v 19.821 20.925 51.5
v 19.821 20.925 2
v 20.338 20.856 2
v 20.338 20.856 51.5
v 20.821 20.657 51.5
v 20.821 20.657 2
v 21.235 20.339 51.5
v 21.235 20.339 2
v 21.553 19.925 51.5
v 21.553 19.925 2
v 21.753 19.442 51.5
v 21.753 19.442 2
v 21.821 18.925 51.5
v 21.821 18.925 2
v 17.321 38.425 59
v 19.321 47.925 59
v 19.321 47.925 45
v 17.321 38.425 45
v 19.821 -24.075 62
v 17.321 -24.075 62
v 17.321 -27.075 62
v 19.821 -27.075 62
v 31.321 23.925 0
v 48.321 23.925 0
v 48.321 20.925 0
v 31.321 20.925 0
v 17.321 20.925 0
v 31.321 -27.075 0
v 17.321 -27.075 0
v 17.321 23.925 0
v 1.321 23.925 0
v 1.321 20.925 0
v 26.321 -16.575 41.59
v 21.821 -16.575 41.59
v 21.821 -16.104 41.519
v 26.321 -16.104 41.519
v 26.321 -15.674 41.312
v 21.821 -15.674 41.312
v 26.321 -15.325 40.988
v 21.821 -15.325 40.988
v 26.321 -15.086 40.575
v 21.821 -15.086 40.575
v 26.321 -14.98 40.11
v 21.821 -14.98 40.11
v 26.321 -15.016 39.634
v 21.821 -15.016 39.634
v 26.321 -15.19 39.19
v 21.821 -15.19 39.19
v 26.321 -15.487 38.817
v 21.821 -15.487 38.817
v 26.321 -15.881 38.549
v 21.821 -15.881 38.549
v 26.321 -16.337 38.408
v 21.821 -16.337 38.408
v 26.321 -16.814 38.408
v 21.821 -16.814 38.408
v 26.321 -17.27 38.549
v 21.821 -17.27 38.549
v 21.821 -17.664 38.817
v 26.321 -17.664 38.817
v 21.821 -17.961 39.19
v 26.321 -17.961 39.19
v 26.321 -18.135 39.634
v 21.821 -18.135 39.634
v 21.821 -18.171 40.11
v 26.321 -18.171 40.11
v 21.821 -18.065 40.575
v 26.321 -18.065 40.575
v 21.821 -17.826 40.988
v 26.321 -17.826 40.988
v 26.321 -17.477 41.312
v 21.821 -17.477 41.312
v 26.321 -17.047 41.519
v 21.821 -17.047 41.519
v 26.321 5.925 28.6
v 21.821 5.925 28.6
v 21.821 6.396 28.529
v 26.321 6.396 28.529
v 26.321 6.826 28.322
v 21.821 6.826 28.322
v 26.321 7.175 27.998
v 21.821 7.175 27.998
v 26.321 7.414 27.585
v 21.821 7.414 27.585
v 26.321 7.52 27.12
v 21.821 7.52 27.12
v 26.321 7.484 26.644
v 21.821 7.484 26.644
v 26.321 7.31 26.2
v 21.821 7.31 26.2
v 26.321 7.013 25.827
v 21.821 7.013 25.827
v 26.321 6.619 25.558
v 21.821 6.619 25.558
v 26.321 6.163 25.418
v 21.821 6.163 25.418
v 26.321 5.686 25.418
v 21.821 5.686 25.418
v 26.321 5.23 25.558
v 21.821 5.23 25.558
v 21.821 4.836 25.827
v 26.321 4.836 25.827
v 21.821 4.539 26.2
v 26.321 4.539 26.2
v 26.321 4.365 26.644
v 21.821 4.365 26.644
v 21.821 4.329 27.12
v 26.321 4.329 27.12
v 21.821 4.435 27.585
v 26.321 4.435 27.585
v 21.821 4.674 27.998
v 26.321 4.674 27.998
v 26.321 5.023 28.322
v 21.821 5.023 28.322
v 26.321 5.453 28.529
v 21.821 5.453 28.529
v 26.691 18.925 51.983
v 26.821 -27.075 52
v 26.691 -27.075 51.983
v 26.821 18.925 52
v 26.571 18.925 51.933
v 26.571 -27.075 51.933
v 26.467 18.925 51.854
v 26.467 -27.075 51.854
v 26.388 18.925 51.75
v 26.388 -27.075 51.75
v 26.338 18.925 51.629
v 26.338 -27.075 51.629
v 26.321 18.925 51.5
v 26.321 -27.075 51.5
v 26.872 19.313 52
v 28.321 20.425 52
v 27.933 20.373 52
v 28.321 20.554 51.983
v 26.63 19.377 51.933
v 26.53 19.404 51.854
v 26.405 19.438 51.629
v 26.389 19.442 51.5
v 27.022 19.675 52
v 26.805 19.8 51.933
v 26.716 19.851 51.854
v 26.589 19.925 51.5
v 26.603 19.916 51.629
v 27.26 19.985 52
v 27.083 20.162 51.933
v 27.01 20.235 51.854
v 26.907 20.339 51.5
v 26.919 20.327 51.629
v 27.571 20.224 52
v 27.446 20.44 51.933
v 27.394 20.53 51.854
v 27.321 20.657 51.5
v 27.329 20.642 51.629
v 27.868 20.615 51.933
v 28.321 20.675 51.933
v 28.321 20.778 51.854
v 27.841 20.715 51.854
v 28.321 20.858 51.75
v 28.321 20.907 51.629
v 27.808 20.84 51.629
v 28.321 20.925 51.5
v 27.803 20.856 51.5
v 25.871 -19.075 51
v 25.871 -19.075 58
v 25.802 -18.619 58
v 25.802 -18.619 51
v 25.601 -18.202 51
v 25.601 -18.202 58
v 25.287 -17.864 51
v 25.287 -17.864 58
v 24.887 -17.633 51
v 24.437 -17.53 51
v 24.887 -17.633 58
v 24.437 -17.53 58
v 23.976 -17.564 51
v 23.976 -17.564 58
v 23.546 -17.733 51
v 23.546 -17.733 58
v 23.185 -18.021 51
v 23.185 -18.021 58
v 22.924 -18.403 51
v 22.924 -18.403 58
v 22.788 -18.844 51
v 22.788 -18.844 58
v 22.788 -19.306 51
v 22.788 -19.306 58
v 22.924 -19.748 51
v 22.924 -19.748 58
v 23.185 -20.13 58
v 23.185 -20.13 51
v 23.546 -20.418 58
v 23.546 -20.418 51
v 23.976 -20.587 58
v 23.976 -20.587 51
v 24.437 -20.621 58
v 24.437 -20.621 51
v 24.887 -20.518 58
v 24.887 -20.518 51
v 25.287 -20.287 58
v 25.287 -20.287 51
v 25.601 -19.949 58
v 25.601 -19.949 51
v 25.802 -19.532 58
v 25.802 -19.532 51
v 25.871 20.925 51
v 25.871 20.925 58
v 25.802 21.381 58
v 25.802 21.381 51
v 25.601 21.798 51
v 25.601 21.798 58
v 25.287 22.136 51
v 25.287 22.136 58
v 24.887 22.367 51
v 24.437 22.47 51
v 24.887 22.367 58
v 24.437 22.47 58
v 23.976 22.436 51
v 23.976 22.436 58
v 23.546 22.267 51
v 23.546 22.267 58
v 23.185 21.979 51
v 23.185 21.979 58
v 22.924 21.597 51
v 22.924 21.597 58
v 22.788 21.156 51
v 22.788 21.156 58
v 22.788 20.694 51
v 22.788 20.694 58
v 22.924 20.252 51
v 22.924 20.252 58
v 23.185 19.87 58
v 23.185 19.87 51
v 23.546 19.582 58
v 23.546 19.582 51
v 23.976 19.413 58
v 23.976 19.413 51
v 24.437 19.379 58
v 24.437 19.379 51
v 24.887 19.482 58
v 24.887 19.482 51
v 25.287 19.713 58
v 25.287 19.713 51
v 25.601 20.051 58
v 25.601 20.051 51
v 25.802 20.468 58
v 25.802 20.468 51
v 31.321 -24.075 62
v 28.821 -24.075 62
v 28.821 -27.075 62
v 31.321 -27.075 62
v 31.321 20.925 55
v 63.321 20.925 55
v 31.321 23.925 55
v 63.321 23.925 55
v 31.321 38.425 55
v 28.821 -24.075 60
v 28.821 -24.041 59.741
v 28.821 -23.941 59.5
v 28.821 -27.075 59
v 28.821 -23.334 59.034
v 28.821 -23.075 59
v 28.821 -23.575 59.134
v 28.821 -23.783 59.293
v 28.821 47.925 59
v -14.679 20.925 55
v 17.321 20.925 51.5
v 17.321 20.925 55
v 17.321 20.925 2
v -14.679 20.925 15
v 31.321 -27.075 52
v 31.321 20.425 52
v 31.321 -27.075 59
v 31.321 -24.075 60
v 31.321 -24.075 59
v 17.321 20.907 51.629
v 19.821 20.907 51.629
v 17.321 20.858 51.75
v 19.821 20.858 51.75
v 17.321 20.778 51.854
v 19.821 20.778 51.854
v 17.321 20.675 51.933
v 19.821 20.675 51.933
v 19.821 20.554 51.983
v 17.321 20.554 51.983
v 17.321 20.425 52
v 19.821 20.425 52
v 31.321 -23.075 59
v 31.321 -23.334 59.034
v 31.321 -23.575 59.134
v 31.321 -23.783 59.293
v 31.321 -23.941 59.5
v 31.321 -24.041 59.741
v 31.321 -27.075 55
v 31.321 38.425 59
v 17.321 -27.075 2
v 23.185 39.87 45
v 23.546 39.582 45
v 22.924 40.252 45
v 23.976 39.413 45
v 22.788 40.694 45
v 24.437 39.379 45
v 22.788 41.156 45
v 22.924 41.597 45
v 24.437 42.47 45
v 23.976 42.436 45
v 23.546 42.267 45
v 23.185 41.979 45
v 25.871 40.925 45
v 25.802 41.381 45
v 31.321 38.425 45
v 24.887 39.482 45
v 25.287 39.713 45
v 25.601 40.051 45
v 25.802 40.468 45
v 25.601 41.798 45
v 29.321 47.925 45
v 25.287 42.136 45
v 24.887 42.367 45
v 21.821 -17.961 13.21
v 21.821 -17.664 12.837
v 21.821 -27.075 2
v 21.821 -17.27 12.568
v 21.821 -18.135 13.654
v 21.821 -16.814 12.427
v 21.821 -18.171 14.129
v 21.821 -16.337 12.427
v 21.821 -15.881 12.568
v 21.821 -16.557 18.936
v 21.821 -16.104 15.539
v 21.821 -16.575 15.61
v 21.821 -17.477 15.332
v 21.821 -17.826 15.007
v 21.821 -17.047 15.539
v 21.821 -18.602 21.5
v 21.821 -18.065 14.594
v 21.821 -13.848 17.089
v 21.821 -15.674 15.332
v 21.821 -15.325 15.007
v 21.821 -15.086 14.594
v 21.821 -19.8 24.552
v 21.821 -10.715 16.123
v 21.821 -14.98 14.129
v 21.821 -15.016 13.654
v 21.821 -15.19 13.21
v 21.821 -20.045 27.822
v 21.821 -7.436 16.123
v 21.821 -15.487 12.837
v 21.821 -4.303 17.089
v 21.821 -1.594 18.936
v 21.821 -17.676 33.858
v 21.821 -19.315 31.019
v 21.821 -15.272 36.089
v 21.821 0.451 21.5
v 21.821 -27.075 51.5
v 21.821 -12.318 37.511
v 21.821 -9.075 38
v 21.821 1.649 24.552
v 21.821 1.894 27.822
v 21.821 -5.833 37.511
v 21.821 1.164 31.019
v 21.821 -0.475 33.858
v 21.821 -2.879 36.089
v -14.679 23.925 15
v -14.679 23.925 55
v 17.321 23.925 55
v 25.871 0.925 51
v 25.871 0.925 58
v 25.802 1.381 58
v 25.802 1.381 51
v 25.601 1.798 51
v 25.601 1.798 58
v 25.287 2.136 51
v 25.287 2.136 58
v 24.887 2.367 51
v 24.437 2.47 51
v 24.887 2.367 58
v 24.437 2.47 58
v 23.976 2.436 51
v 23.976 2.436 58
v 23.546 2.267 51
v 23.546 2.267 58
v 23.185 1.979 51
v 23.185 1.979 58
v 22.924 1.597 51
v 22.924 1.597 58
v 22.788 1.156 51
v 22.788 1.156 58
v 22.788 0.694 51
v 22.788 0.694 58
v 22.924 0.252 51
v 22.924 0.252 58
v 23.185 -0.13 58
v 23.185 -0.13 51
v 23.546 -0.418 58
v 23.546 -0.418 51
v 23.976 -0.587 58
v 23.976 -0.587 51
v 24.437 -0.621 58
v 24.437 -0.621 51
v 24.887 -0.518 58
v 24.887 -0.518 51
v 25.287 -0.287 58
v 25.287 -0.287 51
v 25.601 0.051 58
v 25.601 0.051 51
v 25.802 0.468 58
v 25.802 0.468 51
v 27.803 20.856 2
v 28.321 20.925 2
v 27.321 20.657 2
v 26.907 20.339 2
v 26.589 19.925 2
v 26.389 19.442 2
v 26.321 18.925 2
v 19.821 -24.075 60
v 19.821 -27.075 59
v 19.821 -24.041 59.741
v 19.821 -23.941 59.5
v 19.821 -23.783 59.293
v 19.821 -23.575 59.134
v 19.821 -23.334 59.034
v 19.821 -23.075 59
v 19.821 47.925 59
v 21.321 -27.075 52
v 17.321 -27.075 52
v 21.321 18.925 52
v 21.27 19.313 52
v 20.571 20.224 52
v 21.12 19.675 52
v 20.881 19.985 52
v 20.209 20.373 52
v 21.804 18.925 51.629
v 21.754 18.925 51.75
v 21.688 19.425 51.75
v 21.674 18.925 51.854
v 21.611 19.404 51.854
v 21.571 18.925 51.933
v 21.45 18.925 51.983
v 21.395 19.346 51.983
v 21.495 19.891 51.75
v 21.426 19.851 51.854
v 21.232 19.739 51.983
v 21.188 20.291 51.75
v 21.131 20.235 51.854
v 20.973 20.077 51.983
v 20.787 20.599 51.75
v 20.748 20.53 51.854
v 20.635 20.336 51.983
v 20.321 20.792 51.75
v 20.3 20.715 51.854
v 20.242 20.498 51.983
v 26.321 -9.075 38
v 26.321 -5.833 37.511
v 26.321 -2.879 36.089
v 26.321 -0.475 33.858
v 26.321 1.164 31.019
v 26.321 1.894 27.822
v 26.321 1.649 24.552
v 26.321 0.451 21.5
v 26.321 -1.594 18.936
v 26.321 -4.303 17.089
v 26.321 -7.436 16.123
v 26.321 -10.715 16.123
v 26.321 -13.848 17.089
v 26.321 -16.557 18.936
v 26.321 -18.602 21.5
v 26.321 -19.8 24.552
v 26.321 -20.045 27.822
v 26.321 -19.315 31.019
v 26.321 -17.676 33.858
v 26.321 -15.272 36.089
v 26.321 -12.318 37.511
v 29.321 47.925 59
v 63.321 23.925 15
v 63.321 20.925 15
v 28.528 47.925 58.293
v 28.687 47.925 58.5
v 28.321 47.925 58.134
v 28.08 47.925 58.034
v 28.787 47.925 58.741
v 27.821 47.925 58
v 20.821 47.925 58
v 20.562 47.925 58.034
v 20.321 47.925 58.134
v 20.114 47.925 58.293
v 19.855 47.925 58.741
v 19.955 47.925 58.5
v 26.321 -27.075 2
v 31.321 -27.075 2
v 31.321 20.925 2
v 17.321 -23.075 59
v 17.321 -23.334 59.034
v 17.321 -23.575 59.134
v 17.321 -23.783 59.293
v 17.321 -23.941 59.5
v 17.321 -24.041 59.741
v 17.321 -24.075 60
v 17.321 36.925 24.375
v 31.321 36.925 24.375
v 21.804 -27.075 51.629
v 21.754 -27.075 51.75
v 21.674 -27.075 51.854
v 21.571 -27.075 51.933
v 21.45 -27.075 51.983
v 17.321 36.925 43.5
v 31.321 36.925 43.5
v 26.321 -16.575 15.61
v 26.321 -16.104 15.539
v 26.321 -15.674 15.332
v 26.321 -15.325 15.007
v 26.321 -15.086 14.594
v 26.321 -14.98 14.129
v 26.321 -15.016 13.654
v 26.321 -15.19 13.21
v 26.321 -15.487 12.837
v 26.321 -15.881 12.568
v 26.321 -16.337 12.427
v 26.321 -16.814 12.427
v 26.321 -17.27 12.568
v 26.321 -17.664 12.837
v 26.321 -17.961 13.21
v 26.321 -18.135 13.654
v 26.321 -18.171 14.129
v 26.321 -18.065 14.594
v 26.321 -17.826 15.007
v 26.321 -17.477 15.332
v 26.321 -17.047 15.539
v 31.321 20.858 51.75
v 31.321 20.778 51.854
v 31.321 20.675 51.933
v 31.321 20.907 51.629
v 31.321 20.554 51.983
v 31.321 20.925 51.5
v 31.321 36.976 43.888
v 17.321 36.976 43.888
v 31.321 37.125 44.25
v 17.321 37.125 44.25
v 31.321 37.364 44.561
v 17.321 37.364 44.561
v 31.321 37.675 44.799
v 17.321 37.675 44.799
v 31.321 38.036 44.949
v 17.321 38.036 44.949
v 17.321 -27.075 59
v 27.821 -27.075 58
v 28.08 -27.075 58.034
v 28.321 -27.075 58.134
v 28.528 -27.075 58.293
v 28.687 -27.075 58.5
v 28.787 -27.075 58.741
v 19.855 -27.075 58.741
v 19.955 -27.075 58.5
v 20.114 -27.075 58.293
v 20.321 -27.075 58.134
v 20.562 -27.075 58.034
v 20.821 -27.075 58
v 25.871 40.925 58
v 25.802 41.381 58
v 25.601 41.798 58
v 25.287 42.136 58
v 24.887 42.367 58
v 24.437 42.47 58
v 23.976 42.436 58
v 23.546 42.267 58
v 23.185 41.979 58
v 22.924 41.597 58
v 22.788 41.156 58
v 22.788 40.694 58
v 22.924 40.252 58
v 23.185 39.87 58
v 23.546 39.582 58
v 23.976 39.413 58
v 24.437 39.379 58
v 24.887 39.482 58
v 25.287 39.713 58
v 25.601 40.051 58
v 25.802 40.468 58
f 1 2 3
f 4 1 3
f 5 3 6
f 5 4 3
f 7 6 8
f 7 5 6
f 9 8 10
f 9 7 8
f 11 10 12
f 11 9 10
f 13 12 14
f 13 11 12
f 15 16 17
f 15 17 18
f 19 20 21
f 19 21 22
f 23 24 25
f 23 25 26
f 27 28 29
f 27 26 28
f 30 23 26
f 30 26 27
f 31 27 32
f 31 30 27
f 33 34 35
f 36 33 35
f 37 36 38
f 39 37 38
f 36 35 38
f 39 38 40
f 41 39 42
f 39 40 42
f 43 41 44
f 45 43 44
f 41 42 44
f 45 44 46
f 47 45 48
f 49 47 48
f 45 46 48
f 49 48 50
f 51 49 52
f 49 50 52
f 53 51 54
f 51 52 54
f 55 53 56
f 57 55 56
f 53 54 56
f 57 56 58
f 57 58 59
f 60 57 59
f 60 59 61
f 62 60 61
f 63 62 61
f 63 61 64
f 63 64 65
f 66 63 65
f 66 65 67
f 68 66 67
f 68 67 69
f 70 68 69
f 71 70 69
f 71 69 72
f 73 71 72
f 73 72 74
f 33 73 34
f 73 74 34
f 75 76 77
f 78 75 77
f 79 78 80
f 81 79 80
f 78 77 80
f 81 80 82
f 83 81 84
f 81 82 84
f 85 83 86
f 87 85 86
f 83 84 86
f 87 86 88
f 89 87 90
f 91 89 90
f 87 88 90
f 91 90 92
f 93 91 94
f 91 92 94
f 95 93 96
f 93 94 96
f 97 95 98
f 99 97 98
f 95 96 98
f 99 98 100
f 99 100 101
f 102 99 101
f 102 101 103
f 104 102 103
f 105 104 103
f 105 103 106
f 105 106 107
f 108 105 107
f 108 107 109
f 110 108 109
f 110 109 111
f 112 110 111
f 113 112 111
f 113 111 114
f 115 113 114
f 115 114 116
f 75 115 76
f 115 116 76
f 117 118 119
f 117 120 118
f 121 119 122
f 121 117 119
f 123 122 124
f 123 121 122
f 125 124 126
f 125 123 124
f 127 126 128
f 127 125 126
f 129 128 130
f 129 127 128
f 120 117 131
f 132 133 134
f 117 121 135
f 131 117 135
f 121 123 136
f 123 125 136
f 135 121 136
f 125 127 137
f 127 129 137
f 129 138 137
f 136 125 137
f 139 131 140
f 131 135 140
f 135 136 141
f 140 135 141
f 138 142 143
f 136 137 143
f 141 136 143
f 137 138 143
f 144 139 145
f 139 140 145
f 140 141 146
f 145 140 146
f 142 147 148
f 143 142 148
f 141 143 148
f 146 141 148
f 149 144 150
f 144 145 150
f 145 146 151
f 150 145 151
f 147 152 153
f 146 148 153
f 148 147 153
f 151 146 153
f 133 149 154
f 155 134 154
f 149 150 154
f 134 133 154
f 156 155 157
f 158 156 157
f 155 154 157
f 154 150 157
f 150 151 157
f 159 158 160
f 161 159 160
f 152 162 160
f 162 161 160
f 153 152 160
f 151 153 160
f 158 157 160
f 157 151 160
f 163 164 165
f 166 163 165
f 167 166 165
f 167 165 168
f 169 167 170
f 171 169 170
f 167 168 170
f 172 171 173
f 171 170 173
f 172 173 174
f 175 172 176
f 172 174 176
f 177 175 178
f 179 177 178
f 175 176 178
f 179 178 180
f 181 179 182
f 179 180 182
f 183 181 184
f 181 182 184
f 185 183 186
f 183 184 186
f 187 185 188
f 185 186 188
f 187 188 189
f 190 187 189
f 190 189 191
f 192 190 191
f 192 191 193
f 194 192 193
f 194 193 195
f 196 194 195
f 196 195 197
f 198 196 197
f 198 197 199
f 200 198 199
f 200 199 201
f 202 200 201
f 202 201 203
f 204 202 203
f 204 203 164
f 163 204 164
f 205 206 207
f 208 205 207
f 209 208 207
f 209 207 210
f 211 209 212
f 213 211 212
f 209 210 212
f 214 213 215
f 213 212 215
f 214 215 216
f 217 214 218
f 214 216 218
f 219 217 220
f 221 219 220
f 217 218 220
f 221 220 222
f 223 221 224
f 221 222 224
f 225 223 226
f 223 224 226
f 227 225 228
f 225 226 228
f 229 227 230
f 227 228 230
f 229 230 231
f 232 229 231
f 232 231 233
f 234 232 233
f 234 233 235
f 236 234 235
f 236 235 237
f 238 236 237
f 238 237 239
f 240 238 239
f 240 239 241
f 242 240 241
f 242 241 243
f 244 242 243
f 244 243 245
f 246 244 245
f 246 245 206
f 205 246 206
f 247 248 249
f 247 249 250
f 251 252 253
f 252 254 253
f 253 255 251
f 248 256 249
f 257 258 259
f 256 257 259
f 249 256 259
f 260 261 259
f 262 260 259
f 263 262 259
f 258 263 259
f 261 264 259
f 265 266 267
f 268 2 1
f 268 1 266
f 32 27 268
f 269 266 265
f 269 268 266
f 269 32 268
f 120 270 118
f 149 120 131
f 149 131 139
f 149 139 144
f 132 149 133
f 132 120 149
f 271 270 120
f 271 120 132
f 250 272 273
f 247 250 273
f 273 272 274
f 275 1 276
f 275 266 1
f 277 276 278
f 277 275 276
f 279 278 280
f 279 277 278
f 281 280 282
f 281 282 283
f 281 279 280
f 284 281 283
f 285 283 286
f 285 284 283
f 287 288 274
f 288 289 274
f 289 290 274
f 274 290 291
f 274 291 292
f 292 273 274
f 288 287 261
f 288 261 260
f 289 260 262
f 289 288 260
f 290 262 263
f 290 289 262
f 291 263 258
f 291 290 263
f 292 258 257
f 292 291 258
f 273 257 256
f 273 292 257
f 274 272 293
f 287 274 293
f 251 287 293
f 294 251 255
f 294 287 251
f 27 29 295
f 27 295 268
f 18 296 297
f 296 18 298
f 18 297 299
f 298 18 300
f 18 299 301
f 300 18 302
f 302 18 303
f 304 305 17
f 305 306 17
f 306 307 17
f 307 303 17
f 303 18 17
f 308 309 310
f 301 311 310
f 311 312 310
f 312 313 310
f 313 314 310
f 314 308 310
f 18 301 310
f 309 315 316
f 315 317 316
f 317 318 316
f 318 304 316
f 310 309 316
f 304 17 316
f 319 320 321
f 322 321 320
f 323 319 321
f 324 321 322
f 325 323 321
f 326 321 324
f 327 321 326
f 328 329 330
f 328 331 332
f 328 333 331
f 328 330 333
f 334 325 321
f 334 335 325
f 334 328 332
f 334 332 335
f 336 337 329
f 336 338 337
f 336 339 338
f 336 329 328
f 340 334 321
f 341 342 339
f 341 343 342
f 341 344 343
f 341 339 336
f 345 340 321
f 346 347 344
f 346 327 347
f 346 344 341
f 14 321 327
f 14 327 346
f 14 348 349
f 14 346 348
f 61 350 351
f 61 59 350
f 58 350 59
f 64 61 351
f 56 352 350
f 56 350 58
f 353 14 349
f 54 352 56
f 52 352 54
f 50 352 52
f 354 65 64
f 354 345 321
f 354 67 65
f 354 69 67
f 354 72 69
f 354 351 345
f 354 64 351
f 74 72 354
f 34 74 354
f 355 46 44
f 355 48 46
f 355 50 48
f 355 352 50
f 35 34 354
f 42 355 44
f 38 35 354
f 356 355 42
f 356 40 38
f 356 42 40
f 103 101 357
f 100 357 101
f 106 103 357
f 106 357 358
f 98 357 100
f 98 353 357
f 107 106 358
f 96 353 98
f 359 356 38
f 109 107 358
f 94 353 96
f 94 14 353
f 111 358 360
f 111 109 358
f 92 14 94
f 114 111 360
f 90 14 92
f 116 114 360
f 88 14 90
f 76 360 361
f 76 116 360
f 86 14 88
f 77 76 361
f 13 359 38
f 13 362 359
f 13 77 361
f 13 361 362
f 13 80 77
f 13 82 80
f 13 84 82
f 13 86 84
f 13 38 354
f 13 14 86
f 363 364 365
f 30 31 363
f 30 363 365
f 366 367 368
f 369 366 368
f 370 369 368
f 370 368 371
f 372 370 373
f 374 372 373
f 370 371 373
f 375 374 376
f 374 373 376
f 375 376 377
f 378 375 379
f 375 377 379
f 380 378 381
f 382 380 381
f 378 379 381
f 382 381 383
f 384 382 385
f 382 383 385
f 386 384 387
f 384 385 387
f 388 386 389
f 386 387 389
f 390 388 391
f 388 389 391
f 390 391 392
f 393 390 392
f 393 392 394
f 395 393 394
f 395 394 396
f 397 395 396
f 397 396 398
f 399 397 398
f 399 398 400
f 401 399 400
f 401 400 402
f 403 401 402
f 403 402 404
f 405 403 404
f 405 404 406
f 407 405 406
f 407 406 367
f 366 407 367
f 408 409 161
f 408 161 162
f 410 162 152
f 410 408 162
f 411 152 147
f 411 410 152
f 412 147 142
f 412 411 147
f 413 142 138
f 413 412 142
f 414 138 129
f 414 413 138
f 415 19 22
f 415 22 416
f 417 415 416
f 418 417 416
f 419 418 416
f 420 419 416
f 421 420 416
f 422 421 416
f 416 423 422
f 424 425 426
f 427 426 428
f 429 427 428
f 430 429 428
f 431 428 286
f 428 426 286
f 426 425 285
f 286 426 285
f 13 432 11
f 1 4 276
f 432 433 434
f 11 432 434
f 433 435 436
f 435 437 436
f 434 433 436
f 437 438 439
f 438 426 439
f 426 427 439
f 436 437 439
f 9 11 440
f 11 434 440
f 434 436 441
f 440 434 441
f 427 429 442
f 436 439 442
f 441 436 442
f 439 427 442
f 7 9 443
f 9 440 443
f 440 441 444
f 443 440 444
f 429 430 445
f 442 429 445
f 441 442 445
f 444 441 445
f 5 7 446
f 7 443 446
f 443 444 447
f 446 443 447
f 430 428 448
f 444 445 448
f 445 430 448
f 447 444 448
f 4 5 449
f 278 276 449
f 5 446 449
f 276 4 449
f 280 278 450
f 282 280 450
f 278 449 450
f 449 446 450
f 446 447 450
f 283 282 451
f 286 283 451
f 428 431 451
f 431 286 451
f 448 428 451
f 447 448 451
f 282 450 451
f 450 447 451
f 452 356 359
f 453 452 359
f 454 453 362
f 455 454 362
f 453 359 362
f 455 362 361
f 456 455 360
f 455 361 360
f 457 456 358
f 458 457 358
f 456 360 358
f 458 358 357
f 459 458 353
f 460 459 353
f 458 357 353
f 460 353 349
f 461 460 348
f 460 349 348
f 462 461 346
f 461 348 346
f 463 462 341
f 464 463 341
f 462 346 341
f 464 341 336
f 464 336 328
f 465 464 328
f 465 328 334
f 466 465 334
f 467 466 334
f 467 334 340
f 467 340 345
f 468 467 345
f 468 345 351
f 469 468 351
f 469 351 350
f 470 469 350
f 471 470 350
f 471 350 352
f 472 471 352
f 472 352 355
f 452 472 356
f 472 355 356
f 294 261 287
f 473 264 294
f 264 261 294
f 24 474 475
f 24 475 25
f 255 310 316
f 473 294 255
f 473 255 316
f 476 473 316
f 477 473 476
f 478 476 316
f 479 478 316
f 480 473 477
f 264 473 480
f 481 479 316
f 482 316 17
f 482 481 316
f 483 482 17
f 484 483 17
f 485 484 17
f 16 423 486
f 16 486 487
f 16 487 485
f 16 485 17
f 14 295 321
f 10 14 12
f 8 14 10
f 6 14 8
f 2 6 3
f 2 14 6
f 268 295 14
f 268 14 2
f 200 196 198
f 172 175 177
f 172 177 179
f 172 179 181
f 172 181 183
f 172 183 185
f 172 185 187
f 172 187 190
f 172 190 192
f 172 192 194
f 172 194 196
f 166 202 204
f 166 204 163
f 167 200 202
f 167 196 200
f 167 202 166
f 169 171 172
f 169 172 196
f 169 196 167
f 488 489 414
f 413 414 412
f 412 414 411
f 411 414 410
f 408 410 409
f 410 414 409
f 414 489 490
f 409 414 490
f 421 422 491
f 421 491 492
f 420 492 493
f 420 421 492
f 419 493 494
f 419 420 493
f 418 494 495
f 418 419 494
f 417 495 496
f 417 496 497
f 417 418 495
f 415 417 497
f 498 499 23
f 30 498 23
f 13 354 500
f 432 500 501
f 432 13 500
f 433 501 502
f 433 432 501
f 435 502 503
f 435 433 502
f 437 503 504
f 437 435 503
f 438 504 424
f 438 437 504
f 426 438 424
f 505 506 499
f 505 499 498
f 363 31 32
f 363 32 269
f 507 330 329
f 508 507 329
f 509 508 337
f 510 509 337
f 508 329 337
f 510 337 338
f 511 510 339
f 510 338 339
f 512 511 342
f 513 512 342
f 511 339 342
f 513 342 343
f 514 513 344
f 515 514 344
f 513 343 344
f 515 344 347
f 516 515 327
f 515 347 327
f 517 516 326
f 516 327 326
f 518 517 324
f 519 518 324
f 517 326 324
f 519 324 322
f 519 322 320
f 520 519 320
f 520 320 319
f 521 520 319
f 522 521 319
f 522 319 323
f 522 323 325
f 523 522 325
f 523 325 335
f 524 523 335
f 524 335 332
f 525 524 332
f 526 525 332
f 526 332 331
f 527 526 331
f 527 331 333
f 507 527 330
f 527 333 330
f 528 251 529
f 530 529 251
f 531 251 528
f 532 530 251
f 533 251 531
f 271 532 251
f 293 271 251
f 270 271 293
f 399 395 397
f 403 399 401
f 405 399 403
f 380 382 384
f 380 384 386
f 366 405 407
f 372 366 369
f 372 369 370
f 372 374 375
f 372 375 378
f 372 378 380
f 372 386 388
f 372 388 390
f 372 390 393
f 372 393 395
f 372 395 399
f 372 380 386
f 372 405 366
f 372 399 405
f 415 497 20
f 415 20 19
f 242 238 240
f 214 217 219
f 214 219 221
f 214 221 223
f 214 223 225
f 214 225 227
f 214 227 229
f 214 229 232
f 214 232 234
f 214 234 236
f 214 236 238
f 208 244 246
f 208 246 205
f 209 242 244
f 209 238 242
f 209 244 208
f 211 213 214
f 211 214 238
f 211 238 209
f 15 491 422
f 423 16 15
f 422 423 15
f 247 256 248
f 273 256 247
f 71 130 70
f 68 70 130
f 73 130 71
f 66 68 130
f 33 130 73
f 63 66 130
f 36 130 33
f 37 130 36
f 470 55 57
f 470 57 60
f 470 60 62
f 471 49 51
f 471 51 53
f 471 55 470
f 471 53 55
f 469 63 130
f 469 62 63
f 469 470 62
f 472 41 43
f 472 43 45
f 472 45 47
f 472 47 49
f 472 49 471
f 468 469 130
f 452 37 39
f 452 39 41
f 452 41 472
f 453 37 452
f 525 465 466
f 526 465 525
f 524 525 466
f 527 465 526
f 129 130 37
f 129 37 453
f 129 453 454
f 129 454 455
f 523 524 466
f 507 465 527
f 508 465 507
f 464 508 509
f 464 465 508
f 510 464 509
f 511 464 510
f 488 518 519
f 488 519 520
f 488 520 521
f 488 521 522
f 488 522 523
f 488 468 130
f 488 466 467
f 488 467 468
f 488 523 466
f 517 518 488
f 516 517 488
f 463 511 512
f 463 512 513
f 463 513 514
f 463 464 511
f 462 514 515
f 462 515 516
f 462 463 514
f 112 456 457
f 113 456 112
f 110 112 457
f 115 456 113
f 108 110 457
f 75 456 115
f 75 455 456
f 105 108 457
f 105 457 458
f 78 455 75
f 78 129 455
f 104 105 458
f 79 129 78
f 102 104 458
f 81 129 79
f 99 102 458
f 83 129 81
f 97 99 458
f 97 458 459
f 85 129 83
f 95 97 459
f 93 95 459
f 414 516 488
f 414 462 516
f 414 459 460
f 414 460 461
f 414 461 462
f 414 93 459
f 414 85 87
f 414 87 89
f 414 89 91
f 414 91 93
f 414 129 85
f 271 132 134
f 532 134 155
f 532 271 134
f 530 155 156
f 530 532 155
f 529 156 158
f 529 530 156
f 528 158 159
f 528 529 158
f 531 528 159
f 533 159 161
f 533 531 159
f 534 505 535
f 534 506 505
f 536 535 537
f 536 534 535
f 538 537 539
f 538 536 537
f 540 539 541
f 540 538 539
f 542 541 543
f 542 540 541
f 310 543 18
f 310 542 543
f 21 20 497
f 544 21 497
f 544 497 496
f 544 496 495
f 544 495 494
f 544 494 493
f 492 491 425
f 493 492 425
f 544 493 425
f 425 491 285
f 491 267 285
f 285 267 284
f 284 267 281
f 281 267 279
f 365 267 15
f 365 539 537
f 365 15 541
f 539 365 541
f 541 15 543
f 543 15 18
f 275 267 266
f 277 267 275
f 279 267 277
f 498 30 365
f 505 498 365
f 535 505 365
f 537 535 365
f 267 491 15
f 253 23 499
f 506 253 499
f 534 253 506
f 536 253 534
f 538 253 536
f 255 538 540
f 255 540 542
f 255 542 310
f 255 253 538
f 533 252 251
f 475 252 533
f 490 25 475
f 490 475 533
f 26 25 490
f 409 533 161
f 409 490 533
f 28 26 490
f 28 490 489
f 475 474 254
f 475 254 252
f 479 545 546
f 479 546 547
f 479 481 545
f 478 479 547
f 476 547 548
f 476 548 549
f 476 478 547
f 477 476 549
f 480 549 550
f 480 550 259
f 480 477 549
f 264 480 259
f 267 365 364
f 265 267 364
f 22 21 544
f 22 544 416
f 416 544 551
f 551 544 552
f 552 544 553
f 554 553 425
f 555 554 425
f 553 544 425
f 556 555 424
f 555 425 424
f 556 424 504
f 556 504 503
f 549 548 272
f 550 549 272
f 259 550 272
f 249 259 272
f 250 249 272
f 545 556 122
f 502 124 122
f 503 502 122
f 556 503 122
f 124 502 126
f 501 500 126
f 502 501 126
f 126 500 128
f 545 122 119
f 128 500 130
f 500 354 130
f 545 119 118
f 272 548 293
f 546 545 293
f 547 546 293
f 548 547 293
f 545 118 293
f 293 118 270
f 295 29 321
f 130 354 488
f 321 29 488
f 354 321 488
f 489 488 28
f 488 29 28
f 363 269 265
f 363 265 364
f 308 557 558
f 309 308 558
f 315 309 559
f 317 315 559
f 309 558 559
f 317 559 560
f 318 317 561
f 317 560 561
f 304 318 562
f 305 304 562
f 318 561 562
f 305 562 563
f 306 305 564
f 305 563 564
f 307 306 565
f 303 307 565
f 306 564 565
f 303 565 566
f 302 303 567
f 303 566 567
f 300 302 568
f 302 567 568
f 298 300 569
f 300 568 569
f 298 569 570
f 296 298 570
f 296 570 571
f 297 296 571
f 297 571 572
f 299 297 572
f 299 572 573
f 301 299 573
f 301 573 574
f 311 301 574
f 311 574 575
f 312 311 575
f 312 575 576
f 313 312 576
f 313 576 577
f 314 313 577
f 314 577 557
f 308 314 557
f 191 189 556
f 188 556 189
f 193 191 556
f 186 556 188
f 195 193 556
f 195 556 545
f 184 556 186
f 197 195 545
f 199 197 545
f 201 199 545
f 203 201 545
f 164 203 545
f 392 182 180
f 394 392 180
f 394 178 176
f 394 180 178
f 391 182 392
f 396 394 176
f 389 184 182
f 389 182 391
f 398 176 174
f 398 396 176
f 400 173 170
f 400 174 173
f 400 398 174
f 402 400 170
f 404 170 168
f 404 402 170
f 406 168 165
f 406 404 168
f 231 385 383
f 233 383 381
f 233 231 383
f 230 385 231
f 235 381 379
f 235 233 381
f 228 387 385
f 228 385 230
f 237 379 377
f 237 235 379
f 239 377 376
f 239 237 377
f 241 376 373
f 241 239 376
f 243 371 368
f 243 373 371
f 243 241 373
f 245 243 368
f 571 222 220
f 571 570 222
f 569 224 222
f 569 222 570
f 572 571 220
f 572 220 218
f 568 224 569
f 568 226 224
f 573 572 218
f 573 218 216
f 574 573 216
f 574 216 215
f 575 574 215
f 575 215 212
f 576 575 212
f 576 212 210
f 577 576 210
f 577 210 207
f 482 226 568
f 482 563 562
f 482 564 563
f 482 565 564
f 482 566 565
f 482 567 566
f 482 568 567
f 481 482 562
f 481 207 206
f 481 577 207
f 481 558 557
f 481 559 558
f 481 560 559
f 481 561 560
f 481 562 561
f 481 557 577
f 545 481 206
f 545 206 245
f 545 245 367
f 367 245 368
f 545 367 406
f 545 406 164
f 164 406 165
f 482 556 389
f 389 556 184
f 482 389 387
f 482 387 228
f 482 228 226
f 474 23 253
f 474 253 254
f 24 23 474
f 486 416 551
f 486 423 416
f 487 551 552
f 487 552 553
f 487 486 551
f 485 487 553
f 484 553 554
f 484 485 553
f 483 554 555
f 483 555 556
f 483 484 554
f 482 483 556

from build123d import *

# Parameters (mm, degrees)
EXTRUDE_2_DEPTH      = 55
SKETCH_5_W           = 50
SKETCH_5_H           = 58
CUT_EXTRUDE_2_DEPTH  = 4.5
SKETCH_6_R           = 11
SKETCH_6_R_2         = 1.6
CUT_EXTRUDE_3_DEPTH  = 4.5
SKETCH_8_W           = 14.000064841
SKETCH_8_H           = 24
EXTRUDE_3_DEPTH      = 55
SKETCH_9_R           = 1.55
CUT_EXTRUDE_4_DEPTH  = 4
CUT_EXTRUDE_8_DEPTH  = 55
CUT_EXTRUDE_12_DEPTH = 15
CUT_EXTRUDE_13_DEPTH = 3
SKETCH_23_W          = 50
SKETCH_23_H          = 58
CUT_EXTRUDE_14_DEPTH = 5
SKETCH_24_W          = 14
SKETCH_24_H          = 10
CUT_EXTRUDE_15_DEPTH = 56
FILLET_1_R           = 2
FILLET_2_R           = 2
FILLET_3_R           = 0.5
CUT_EXTRUDE_16_DEPTH = 11
FILLET_4_R           = 1.5
EXTRUDE_START        = 4
SKETCH_26_R          = 1.55
EXTRUDE_4_DEPTH      = 4
SKETCH_27_W          = 9
SKETCH_27_H          = 75
CUT_EXTRUDE_17_DEPTH = 1
FILLET_5_R           = 1
SKETCH_28_W          = 2.500032421
SKETCH_28_H          = 3
SKETCH_28_W_2        = 2.499970549
EXTRUDE_5_DEPTH      = 3
FILLET_6_R           = 1
SKETCH_29_R          = 1.55
CUT_EXTRUDE_18_DEPTH = 11


# Some blends are built 0.0001 mm under size
with BuildPart() as part:
    # 草图4 → 凸台-拉伸2 (new body)
    with BuildSketch(Plane.XY):
        Polygon((-14.679245283, 23.924528302), (63.320754717, 23.924528302), (63.320754717, 20.924528302), (31.320754717, 20.924528302), (31.320754717, -37.075471698), (17.320754717, -37.075471698), (17.320754717, 20.924528302), (-14.679245283, 20.924528302), align=None)
    extrude(amount=EXTRUDE_2_DEPTH)

    # 草图5 → 切除-拉伸2 (cut)
    with BuildSketch(Plane.ZY.offset(-17.320754717)):
        with Locations((27, -8.075471698)):
            Rectangle(SKETCH_5_W, SKETCH_5_H)
    extrude(amount=-CUT_EXTRUDE_2_DEPTH, mode=Mode.SUBTRACT)

    # 草图6 → 切除-拉伸3 (cut)
    with BuildSketch(Plane.ZY.offset(-21.820754717)):
        with Locations((27, -9.075471698)):
            Circle(SKETCH_6_R)
        with Locations((27, 5.924528302)):
            Circle(SKETCH_6_R_2)
        with Locations((39.990381057, -16.575471698)):
            Circle(SKETCH_6_R_2)
        with Locations((14.009618943, -16.575471698)):
            Circle(SKETCH_6_R_2)
    extrude(amount=-CUT_EXTRUDE_3_DEPTH, mode=Mode.SUBTRACT)

    # 草图8 → 凸台-拉伸3 (add)
    with BuildSketch(Plane.XY.offset(55)):
        with Locations((24.320787138, 35.924528302)):
            Rectangle(SKETCH_8_W, SKETCH_8_H)
    extrude(amount=-EXTRUDE_3_DEPTH)

    # 草图9 → 切除-拉伸4 (cut)
    with BuildSketch(Plane.XY.offset(55)):
        with Locations((24.320784468, 40.924528302)):
            Circle(SKETCH_9_R)
        with Locations((24.320784468, 20.924528302)):
            Circle(SKETCH_9_R)
        with Locations((24.320784468, 0.924528302)):
            Circle(SKETCH_9_R)
        with Locations((24.320784468, -19.075471698)):
            Circle(SKETCH_9_R)
    extrude(amount=-CUT_EXTRUDE_4_DEPTH, mode=Mode.SUBTRACT)

    # 草图13 → 切除-拉伸8 (cut)
    with BuildSketch(Plane.XY.offset(55)):
        Polygon((17.320754717, 47.924528302), (19.320754717, 47.924528302), (17.320754717, 38.424528302), align=None)
        Polygon((29.320819558, 47.924528302), (31.320819558, 47.924528302), (31.320819558, 38.424528302), align=None)
    extrude(amount=-CUT_EXTRUDE_8_DEPTH, mode=Mode.SUBTRACT)

    # 草图20 → 切除-拉伸12 (cut)
    with BuildSketch(Plane(origin=(31.320819558, 0, 0), x_dir=(0, 0, -1), z_dir=(1, 0, 0))):
        Polygon((0, 23.924528302), (0, 47.924528302), (-45, 47.924528302), align=None)
    extrude(amount=-CUT_EXTRUDE_12_DEPTH, mode=Mode.SUBTRACT)

    # 草图21 → 切除-拉伸13 (cut)
    with BuildSketch(Plane(origin=(0, 23.924528302, 0), x_dir=(1, 0, 0), z_dir=(0, 1, 0))):
        Polygon((-14.679245283, 0), (1.320754717, 0), (-14.679245283, -15), align=None)
        Polygon((48.320754717, 0), (63.320754717, 0), (63.320754717, -15), align=None)
    extrude(amount=-CUT_EXTRUDE_13_DEPTH, mode=Mode.SUBTRACT)

    # 草图23 → 切除-拉伸14 (cut)
    with BuildSketch(Plane(origin=(31.320754717, 0, 0), x_dir=(0, 0, -1), z_dir=(1, 0, 0))):
        with Locations((-27, -8.075471698)):
            Rectangle(SKETCH_23_W, SKETCH_23_H)
    extrude(amount=-CUT_EXTRUDE_14_DEPTH, mode=Mode.SUBTRACT)

    # 草图24 → 切除-拉伸15 (cut)
    with BuildSketch(Plane.XY.offset(55)):
        with Locations((24.320754717, -32.075471698)):
            Rectangle(SKETCH_24_W, SKETCH_24_H)
    extrude(amount=-CUT_EXTRUDE_15_DEPTH, mode=Mode.SUBTRACT)

    # 圆角1
    fillet_1_edges = [part.edges().sort_by_distance(p)[0] for p in [
        (21.820754717, 20.924528302, 27),
    ]]
    fillet(fillet_1_edges, radius=FILLET_1_R)

    # 圆角2
    fillet_2_edges = [part.edges().sort_by_distance(p)[0] for p in [
        (26.320754717, 20.924528302, 27),
    ]]
    fillet(fillet_2_edges, radius=FILLET_2_R)

    # 圆角3
    fillet_3_edges = [part.edges().sort_by_distance(p)[0] for p in [
        (21.820754717, -4.075471698, 52),
        (18.570754717, 20.924528302, 52),
        (21.234968279, 20.338741864, 52),
        (26.320754717, -4.075471698, 52),
        (29.820754717, 20.924528302, 52),
        (26.906541155, 20.338741864, 52),
    ]]
    fillet(fillet_3_edges, radius=FILLET_3_R)

    # 草图25 → 切除-拉伸16 (cut)
    with BuildSketch(Plane(origin=(0, 47.924528302, 0), x_dir=(1, 0, 0), z_dir=(0, 1, 0))):
        Polygon((19.320754717, -45), (17.320754717, -45), (17.320754717, -24), (31.320819558, -24), (31.320819558, -45), align=None)
    extrude(amount=-CUT_EXTRUDE_16_DEPTH, mode=Mode.SUBTRACT)

    # 圆角4
    fillet_4_edges = [part.edges().sort_by_distance(p)[0] for p in [
        (24.320787138, 36.924528302, 45),
    ]]
    fillet(fillet_4_edges, radius=FILLET_4_R)

    # 草图26 → 凸台-拉伸4 (add)
    with BuildSketch(Plane.XY.offset(55).offset(EXTRUDE_START)):
        Polygon((17.320754717, -27.075471698), (31.320754717, -27.075471698), (31.320819558, 38.424528302), (29.320819558, 47.924528302), (19.320754717, 47.924528302), (17.320754717, 38.424528302), align=None)
        with Locations((24.320784468, -19.075471698)):
            Circle(SKETCH_26_R, mode=Mode.SUBTRACT)
        with Locations((24.320784468, 0.924528302)):
            Circle(SKETCH_26_R, mode=Mode.SUBTRACT)
        with Locations((24.320784468, 20.924528302)):
            Circle(SKETCH_26_R, mode=Mode.SUBTRACT)
        with Locations((24.320784468, 40.924528302)):
            Circle(SKETCH_26_R, mode=Mode.SUBTRACT)
    extrude(amount=-EXTRUDE_4_DEPTH)

    # 草图27 → 切除-拉伸17 (cut)
    with BuildSketch(Plane.XY.offset(59)):
        with Locations((24.320787138, 10.424528302)):
            Rectangle(SKETCH_27_W, SKETCH_27_H)
    extrude(amount=-CUT_EXTRUDE_17_DEPTH, mode=Mode.SUBTRACT)

    # 圆角5
    fillet_5_edges = [part.edges().sort_by_distance(p)[0] for p in [
        (28.820787138, 10.424528302, 58),
        (19.820787138, 10.424528302, 58),
    ]]
    fillet(fillet_5_edges, radius=FILLET_5_R - 0.0001)  # a hair under: the kernel refuses the full size

    # 草图28 → 凸台-拉伸5 (add)
    with BuildSketch(Plane.XY.offset(59)):
        with Locations((18.570770927, -25.575471698)):
            Rectangle(SKETCH_28_W, SKETCH_28_H)
        with Locations((30.070772412, -25.575471698)):
            Rectangle(SKETCH_28_W_2, SKETCH_28_H)
    extrude(amount=EXTRUDE_5_DEPTH)

    # 圆角6
    # the kernel refuses this fillet: 1 mm, written as the material it adds along each edge
    with BuildSketch(Plane(origin=(19.820787138, -24.075471698, 59), x_dir=(0, 0, 1), z_dir=(-1, 0, 0))) as fillet_6_piece_1:
        with BuildLine():
            CenterArc((FILLET_6_R, FILLET_6_R), FILLET_6_R, 180, 90)
            Line((0, FILLET_6_R), (0, 0))
            Line((0, 0), (FILLET_6_R, 0))
        make_face()
    extrude(amount=2.500032421)
    with BuildSketch(Plane(origin=(33.820757687, -24.075471698, 59), x_dir=(0, 1, 0), z_dir=(-1, 0, 0))) as fillet_6_piece_2_section:
        with BuildLine():
            CenterArc((FILLET_6_R, -FILLET_6_R), FILLET_6_R, 90, 90)
            Line((0, -FILLET_6_R), (0, 0))
            Line((0, 0), (FILLET_6_R, 0))
        make_face()
    fillet_6_piece_2 = extrude(amount=4.999970549, mode=Mode.PRIVATE)
    fillet_6_piece_2 = split(fillet_6_piece_2, bisect_by=Plane(origin=(31.320757908, -23.852105032, 59.223367959), z_dir=(-0.9999999999995101, 9.899447945822129e-07, 0)), keep=Keep.TOP, mode=Mode.PRIVATE)
    add(fillet_6_piece_2)

    # 草图29 → 切除-拉伸18 (cut)
    with BuildSketch(Plane.XY.offset(51)):
        with Locations((24.320784468, 40.924528302)):
            Circle(SKETCH_29_R)
    extrude(amount=-CUT_EXTRUDE_18_DEPTH, mode=Mode.SUBTRACT)


solid = part.part
